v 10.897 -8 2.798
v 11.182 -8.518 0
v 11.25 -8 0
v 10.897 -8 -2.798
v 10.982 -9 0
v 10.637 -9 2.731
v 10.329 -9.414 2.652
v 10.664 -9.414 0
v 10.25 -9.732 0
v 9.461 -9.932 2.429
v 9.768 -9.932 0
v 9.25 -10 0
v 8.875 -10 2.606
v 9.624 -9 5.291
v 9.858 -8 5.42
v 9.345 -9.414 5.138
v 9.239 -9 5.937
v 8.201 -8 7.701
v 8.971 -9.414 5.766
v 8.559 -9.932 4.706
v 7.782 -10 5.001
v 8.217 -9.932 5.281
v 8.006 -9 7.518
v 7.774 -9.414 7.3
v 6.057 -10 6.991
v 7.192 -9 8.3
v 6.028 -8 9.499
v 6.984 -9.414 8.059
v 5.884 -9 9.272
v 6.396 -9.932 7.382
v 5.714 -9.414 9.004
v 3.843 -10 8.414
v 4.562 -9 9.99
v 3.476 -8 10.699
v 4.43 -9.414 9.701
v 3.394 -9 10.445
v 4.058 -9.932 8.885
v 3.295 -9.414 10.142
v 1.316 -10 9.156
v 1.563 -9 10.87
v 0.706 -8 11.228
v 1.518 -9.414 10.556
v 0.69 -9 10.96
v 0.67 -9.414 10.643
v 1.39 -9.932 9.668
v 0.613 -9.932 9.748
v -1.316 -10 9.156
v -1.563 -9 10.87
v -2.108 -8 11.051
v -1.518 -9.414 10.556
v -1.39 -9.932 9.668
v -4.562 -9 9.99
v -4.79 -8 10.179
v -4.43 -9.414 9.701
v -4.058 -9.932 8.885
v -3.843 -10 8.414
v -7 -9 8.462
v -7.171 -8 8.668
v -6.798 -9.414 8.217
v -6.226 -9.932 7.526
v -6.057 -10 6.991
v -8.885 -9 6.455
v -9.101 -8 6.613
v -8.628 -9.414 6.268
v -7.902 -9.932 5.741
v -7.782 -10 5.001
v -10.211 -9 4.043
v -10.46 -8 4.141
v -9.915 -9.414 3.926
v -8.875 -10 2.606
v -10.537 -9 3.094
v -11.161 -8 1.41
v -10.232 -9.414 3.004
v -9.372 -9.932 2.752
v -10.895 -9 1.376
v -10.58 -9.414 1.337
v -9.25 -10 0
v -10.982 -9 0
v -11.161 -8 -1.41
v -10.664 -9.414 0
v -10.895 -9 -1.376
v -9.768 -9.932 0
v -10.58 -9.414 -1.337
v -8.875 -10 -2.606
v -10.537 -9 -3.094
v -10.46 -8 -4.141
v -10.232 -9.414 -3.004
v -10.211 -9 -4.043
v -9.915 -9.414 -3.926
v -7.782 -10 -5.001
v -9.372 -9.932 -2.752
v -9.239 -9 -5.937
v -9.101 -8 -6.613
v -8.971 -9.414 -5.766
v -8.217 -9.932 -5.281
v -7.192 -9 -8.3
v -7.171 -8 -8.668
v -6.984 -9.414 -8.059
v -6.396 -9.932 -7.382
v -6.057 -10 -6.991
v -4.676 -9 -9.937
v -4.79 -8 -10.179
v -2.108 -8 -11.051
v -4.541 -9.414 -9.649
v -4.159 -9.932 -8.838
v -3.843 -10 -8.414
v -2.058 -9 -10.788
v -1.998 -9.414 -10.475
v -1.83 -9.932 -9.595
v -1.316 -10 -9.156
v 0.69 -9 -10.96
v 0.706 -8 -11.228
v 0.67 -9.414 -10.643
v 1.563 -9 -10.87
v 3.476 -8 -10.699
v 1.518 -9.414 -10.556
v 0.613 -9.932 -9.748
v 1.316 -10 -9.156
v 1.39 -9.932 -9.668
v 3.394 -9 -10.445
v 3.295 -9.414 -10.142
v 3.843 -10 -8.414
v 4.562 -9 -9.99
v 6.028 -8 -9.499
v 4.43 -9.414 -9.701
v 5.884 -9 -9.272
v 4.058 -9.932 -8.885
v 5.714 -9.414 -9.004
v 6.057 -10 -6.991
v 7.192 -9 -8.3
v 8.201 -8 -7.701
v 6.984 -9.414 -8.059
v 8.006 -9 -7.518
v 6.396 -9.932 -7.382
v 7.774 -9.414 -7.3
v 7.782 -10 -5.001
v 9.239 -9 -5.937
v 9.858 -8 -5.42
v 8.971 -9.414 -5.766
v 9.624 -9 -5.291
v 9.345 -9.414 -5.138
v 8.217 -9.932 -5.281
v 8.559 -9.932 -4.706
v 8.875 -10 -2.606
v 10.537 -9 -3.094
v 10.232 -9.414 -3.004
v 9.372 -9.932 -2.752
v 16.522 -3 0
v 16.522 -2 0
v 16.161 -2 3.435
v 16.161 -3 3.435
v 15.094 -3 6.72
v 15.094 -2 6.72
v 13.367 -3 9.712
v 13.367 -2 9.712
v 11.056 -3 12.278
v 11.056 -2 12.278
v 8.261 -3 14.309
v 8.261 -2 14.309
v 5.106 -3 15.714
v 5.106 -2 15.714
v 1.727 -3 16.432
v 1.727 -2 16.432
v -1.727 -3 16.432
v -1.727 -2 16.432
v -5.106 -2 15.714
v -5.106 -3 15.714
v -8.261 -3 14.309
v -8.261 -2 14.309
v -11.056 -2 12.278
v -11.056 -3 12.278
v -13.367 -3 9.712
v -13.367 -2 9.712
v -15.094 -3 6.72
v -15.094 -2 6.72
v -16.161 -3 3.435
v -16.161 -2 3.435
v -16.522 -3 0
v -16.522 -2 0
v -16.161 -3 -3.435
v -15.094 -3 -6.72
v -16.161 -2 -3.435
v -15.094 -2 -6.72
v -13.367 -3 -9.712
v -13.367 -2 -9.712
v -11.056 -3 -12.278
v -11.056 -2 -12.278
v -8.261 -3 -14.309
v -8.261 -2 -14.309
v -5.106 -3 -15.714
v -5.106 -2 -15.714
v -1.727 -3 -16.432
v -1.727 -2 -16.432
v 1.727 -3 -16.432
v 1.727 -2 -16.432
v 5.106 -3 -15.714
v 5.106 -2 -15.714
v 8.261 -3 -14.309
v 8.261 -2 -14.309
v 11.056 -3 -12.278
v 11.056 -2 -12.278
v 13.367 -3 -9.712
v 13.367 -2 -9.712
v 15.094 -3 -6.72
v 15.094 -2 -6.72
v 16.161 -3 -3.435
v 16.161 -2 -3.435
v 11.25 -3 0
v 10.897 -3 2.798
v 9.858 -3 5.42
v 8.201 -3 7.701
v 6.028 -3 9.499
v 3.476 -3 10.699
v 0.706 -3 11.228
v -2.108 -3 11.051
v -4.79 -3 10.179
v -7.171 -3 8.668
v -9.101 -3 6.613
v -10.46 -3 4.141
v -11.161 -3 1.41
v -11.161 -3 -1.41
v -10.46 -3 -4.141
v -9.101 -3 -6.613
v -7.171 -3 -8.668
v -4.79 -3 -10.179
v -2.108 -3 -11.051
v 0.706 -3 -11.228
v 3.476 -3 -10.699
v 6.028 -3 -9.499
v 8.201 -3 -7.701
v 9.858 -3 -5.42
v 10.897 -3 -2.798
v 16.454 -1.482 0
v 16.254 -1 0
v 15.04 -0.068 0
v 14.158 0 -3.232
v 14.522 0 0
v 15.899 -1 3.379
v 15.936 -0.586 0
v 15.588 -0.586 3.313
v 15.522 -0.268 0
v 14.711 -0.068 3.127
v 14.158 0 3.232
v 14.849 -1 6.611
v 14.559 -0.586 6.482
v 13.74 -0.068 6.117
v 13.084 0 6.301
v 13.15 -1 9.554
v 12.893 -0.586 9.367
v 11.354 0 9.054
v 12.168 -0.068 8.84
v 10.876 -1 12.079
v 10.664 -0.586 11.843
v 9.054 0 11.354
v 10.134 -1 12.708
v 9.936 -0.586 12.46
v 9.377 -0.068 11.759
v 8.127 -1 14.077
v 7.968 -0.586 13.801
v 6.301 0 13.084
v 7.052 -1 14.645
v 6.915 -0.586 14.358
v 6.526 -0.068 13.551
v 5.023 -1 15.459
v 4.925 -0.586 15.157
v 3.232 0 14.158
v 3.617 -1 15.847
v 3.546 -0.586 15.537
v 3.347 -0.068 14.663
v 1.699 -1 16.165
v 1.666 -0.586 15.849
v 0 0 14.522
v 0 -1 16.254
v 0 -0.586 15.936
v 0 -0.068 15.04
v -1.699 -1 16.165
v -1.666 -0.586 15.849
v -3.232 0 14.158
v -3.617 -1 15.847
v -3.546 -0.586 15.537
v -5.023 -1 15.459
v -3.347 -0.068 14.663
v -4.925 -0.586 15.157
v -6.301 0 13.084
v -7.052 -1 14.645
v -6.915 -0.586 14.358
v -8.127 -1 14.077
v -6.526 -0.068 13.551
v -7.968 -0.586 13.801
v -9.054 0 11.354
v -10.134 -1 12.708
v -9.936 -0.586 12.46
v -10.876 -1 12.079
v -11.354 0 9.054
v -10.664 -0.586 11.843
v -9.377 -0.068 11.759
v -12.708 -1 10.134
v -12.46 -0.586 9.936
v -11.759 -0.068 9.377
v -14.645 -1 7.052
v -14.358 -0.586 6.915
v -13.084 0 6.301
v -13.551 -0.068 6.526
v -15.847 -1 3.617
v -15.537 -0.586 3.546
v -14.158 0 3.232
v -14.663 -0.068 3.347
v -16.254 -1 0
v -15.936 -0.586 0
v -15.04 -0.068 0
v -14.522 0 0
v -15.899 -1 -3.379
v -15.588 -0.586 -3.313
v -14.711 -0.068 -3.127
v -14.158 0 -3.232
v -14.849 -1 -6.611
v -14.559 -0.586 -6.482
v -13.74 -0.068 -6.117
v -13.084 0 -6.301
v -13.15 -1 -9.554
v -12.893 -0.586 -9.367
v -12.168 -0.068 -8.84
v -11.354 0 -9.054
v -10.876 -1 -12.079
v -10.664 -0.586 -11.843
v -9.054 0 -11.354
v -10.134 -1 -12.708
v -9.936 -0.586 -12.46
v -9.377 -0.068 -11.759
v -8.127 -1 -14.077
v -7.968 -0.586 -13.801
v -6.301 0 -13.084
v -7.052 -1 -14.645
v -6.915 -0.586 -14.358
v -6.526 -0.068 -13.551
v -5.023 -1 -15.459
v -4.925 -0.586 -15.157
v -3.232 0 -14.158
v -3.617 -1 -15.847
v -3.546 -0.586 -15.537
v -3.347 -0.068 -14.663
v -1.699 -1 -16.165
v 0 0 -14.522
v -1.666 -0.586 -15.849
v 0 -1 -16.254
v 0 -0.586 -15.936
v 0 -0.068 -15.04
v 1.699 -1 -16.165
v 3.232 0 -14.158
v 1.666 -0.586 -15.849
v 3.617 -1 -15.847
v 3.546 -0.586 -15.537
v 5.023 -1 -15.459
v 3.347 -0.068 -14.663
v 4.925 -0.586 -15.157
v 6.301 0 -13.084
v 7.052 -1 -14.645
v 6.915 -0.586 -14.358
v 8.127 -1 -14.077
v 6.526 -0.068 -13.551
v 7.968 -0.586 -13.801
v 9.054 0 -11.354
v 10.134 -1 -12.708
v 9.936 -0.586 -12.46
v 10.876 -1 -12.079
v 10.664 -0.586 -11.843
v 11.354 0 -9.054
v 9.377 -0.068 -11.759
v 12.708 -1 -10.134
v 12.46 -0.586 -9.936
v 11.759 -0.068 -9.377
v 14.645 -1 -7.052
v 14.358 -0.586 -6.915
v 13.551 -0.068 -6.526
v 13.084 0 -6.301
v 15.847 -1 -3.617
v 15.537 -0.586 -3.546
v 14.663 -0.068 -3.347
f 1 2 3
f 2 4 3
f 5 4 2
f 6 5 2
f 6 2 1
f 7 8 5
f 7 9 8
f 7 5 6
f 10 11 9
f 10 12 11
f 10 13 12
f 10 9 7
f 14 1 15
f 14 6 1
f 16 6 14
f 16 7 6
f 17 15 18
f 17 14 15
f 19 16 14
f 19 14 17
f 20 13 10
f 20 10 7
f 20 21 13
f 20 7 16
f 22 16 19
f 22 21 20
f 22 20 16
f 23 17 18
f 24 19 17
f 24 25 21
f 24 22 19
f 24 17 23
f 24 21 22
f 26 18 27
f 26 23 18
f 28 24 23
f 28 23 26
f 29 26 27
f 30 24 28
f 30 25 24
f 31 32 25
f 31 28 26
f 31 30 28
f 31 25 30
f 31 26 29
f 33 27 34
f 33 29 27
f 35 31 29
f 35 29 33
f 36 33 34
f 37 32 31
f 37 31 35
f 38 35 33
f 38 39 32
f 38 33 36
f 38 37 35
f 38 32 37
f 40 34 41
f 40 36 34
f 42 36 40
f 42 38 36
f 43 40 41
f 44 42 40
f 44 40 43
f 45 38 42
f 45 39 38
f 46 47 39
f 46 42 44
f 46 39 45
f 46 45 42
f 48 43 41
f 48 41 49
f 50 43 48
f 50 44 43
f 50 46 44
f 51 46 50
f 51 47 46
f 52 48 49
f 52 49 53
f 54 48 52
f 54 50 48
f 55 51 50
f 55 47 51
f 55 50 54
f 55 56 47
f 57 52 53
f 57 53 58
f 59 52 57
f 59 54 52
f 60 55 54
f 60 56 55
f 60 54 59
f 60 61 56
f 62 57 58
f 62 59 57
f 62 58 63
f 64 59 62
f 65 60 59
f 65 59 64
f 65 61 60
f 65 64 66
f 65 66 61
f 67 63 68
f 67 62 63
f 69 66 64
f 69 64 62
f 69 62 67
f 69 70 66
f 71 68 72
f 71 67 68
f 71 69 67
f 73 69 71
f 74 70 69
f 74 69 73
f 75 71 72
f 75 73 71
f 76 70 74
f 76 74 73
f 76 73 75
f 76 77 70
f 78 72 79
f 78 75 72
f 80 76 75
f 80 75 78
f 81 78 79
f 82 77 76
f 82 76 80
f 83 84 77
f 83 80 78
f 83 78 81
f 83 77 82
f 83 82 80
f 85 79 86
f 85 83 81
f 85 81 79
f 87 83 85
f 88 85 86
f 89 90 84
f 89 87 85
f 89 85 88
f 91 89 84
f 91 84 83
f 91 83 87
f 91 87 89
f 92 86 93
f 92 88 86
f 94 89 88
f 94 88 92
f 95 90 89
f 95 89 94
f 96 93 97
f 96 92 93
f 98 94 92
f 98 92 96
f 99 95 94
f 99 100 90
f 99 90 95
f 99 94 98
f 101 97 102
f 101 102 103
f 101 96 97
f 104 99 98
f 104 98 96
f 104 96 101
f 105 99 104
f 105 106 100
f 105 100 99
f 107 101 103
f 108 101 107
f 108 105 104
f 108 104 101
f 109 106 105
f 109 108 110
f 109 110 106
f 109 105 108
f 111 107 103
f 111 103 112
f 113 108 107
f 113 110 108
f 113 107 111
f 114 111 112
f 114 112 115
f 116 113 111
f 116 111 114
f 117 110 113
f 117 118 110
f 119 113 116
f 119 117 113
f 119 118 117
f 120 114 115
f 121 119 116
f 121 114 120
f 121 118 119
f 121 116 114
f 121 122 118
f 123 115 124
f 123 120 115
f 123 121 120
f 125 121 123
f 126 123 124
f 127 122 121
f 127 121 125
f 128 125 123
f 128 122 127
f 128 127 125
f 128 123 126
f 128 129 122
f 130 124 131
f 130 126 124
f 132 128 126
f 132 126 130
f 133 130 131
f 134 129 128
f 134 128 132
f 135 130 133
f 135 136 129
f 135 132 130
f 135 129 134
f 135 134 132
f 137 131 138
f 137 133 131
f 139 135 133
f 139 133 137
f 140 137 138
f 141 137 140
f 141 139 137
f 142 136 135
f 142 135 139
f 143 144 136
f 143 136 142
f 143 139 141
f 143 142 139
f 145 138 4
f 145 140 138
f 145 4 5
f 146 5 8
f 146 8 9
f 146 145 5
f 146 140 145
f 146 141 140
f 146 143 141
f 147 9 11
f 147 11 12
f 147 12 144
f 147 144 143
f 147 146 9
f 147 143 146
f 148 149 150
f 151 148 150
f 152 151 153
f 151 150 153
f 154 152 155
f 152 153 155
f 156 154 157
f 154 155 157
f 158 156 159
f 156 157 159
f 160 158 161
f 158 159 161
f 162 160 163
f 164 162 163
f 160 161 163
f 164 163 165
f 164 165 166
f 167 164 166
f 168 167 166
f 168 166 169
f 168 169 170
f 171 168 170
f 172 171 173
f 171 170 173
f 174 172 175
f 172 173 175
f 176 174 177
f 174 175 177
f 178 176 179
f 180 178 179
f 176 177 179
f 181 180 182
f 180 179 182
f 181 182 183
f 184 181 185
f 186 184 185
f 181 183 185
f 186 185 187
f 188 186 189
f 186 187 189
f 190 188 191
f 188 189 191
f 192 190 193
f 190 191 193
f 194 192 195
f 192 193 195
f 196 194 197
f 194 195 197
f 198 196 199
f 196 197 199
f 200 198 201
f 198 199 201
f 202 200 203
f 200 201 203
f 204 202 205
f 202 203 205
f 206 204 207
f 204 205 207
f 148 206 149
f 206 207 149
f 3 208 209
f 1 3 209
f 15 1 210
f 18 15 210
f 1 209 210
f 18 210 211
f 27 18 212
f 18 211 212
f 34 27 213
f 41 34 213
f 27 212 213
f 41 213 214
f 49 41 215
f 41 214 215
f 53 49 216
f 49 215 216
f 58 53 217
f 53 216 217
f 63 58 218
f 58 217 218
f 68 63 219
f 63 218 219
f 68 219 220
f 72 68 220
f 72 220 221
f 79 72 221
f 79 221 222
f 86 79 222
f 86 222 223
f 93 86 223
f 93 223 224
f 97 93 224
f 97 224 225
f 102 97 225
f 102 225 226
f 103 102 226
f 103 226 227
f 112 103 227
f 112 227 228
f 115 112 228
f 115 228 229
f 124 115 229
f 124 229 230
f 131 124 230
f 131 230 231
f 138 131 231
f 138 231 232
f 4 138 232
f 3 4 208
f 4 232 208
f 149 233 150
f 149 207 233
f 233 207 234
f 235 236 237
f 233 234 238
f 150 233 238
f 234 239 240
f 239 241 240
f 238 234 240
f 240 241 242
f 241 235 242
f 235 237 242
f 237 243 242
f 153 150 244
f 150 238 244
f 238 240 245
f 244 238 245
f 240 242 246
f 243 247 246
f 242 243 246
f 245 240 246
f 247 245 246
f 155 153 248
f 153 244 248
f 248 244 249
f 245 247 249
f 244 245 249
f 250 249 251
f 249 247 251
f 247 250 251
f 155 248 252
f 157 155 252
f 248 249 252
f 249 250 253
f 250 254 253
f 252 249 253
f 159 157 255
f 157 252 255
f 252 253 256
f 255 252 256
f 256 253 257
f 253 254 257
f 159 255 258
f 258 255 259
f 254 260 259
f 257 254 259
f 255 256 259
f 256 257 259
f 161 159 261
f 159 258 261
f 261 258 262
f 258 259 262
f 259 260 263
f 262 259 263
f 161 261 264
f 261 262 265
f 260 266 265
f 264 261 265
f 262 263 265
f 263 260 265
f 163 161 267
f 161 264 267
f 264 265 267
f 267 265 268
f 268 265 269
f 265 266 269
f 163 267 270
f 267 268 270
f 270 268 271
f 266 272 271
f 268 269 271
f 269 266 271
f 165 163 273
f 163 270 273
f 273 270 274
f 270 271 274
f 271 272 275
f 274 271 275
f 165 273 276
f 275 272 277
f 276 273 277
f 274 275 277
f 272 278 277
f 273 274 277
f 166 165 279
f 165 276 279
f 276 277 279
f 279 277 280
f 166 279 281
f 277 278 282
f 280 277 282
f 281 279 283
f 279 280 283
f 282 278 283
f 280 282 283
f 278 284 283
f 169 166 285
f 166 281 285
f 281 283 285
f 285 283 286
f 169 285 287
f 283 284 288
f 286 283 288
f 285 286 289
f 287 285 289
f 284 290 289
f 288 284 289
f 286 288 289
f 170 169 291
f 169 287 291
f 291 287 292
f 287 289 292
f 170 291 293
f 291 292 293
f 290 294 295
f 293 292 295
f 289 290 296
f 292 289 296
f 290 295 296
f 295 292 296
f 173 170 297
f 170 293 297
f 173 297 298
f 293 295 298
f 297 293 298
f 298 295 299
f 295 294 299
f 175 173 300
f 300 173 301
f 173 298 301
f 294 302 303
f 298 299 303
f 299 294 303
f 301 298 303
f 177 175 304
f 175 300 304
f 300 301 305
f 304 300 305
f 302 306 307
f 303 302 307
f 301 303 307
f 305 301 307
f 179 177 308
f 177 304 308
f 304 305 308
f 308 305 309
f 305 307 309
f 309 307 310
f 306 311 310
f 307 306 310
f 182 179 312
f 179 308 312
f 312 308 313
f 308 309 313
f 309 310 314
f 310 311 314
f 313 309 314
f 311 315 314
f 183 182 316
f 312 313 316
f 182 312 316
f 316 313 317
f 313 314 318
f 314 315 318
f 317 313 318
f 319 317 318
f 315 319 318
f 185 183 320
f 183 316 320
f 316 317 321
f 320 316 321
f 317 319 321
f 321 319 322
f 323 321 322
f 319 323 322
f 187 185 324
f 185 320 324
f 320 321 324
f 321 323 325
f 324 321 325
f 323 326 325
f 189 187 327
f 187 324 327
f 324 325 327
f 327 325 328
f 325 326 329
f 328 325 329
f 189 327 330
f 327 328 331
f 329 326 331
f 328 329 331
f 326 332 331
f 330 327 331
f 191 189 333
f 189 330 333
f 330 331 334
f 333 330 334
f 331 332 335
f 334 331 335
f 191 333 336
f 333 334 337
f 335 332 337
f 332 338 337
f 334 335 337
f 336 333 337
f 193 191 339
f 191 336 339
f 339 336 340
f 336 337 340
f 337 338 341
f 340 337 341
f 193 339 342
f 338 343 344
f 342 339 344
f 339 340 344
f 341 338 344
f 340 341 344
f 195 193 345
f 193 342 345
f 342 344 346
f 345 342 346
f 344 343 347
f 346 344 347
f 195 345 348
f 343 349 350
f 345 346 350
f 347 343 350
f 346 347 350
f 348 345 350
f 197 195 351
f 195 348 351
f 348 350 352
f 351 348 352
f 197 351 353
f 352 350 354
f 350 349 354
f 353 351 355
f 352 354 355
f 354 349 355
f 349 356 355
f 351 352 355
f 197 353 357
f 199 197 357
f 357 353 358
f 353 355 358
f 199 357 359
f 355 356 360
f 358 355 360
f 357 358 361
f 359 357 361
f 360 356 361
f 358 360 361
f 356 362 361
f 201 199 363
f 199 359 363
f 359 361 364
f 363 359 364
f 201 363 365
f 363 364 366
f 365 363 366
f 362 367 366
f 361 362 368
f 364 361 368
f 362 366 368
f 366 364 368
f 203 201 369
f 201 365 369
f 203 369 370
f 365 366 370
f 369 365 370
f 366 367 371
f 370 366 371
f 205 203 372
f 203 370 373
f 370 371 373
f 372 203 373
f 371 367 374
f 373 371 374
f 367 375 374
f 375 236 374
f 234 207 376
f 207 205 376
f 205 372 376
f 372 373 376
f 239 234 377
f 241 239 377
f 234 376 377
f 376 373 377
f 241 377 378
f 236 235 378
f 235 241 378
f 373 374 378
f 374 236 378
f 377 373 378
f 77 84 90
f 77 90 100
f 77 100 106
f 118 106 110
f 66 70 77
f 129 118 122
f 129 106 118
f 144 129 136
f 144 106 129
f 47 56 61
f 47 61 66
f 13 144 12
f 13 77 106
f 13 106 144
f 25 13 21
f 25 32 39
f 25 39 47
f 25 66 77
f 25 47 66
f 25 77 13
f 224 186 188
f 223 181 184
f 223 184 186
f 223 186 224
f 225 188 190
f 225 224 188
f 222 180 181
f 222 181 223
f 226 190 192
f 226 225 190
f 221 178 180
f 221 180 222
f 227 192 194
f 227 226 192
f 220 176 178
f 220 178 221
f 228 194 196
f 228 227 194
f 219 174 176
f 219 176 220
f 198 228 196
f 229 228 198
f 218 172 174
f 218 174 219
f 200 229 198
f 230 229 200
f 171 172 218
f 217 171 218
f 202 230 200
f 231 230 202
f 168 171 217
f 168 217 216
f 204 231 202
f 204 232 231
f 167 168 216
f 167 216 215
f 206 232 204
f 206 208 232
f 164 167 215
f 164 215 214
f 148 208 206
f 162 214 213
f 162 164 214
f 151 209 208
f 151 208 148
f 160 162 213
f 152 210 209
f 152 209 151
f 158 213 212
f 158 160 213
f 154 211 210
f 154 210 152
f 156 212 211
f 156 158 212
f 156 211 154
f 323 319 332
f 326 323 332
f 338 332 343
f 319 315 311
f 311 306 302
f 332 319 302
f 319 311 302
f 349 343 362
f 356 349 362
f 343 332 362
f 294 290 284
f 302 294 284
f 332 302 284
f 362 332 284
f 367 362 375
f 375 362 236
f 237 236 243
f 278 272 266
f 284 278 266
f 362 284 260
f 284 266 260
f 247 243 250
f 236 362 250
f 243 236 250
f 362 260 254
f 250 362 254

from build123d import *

# Parameters (mm, degrees)
F0_R     = 16.522283
F0_R_2   = 11.25
F1_DEPTH = 3
F2_DEPTH = 10
F3_R     = 2
F4_R     = 2


with BuildPart() as f1:
    # F0 (on Front) → F1 (new body)
    with BuildSketch(Plane.XZ):
        Circle(F0_R)
        Circle(F0_R_2, mode=Mode.SUBTRACT)
    extrude(amount=F1_DEPTH)

    # F0 (on Front) → F2 (join)
    with BuildSketch(Plane.XZ):
        Circle(F0_R_2)
    extrude(amount=F2_DEPTH)

    # F3
    f3_edges = [f1.edges().sort_by_distance(p)[0] for p in [
        (-16.522283, 0, 0),
    ]]
    fillet(f3_edges, radius=F3_R)

    # F4
    f4_edges = [f1.edges().sort_by_distance(p)[0] for p in [
        (-11.25, -10, 0),
    ]]
    fillet(f4_edges, radius=F4_R)


solid = f1.part
